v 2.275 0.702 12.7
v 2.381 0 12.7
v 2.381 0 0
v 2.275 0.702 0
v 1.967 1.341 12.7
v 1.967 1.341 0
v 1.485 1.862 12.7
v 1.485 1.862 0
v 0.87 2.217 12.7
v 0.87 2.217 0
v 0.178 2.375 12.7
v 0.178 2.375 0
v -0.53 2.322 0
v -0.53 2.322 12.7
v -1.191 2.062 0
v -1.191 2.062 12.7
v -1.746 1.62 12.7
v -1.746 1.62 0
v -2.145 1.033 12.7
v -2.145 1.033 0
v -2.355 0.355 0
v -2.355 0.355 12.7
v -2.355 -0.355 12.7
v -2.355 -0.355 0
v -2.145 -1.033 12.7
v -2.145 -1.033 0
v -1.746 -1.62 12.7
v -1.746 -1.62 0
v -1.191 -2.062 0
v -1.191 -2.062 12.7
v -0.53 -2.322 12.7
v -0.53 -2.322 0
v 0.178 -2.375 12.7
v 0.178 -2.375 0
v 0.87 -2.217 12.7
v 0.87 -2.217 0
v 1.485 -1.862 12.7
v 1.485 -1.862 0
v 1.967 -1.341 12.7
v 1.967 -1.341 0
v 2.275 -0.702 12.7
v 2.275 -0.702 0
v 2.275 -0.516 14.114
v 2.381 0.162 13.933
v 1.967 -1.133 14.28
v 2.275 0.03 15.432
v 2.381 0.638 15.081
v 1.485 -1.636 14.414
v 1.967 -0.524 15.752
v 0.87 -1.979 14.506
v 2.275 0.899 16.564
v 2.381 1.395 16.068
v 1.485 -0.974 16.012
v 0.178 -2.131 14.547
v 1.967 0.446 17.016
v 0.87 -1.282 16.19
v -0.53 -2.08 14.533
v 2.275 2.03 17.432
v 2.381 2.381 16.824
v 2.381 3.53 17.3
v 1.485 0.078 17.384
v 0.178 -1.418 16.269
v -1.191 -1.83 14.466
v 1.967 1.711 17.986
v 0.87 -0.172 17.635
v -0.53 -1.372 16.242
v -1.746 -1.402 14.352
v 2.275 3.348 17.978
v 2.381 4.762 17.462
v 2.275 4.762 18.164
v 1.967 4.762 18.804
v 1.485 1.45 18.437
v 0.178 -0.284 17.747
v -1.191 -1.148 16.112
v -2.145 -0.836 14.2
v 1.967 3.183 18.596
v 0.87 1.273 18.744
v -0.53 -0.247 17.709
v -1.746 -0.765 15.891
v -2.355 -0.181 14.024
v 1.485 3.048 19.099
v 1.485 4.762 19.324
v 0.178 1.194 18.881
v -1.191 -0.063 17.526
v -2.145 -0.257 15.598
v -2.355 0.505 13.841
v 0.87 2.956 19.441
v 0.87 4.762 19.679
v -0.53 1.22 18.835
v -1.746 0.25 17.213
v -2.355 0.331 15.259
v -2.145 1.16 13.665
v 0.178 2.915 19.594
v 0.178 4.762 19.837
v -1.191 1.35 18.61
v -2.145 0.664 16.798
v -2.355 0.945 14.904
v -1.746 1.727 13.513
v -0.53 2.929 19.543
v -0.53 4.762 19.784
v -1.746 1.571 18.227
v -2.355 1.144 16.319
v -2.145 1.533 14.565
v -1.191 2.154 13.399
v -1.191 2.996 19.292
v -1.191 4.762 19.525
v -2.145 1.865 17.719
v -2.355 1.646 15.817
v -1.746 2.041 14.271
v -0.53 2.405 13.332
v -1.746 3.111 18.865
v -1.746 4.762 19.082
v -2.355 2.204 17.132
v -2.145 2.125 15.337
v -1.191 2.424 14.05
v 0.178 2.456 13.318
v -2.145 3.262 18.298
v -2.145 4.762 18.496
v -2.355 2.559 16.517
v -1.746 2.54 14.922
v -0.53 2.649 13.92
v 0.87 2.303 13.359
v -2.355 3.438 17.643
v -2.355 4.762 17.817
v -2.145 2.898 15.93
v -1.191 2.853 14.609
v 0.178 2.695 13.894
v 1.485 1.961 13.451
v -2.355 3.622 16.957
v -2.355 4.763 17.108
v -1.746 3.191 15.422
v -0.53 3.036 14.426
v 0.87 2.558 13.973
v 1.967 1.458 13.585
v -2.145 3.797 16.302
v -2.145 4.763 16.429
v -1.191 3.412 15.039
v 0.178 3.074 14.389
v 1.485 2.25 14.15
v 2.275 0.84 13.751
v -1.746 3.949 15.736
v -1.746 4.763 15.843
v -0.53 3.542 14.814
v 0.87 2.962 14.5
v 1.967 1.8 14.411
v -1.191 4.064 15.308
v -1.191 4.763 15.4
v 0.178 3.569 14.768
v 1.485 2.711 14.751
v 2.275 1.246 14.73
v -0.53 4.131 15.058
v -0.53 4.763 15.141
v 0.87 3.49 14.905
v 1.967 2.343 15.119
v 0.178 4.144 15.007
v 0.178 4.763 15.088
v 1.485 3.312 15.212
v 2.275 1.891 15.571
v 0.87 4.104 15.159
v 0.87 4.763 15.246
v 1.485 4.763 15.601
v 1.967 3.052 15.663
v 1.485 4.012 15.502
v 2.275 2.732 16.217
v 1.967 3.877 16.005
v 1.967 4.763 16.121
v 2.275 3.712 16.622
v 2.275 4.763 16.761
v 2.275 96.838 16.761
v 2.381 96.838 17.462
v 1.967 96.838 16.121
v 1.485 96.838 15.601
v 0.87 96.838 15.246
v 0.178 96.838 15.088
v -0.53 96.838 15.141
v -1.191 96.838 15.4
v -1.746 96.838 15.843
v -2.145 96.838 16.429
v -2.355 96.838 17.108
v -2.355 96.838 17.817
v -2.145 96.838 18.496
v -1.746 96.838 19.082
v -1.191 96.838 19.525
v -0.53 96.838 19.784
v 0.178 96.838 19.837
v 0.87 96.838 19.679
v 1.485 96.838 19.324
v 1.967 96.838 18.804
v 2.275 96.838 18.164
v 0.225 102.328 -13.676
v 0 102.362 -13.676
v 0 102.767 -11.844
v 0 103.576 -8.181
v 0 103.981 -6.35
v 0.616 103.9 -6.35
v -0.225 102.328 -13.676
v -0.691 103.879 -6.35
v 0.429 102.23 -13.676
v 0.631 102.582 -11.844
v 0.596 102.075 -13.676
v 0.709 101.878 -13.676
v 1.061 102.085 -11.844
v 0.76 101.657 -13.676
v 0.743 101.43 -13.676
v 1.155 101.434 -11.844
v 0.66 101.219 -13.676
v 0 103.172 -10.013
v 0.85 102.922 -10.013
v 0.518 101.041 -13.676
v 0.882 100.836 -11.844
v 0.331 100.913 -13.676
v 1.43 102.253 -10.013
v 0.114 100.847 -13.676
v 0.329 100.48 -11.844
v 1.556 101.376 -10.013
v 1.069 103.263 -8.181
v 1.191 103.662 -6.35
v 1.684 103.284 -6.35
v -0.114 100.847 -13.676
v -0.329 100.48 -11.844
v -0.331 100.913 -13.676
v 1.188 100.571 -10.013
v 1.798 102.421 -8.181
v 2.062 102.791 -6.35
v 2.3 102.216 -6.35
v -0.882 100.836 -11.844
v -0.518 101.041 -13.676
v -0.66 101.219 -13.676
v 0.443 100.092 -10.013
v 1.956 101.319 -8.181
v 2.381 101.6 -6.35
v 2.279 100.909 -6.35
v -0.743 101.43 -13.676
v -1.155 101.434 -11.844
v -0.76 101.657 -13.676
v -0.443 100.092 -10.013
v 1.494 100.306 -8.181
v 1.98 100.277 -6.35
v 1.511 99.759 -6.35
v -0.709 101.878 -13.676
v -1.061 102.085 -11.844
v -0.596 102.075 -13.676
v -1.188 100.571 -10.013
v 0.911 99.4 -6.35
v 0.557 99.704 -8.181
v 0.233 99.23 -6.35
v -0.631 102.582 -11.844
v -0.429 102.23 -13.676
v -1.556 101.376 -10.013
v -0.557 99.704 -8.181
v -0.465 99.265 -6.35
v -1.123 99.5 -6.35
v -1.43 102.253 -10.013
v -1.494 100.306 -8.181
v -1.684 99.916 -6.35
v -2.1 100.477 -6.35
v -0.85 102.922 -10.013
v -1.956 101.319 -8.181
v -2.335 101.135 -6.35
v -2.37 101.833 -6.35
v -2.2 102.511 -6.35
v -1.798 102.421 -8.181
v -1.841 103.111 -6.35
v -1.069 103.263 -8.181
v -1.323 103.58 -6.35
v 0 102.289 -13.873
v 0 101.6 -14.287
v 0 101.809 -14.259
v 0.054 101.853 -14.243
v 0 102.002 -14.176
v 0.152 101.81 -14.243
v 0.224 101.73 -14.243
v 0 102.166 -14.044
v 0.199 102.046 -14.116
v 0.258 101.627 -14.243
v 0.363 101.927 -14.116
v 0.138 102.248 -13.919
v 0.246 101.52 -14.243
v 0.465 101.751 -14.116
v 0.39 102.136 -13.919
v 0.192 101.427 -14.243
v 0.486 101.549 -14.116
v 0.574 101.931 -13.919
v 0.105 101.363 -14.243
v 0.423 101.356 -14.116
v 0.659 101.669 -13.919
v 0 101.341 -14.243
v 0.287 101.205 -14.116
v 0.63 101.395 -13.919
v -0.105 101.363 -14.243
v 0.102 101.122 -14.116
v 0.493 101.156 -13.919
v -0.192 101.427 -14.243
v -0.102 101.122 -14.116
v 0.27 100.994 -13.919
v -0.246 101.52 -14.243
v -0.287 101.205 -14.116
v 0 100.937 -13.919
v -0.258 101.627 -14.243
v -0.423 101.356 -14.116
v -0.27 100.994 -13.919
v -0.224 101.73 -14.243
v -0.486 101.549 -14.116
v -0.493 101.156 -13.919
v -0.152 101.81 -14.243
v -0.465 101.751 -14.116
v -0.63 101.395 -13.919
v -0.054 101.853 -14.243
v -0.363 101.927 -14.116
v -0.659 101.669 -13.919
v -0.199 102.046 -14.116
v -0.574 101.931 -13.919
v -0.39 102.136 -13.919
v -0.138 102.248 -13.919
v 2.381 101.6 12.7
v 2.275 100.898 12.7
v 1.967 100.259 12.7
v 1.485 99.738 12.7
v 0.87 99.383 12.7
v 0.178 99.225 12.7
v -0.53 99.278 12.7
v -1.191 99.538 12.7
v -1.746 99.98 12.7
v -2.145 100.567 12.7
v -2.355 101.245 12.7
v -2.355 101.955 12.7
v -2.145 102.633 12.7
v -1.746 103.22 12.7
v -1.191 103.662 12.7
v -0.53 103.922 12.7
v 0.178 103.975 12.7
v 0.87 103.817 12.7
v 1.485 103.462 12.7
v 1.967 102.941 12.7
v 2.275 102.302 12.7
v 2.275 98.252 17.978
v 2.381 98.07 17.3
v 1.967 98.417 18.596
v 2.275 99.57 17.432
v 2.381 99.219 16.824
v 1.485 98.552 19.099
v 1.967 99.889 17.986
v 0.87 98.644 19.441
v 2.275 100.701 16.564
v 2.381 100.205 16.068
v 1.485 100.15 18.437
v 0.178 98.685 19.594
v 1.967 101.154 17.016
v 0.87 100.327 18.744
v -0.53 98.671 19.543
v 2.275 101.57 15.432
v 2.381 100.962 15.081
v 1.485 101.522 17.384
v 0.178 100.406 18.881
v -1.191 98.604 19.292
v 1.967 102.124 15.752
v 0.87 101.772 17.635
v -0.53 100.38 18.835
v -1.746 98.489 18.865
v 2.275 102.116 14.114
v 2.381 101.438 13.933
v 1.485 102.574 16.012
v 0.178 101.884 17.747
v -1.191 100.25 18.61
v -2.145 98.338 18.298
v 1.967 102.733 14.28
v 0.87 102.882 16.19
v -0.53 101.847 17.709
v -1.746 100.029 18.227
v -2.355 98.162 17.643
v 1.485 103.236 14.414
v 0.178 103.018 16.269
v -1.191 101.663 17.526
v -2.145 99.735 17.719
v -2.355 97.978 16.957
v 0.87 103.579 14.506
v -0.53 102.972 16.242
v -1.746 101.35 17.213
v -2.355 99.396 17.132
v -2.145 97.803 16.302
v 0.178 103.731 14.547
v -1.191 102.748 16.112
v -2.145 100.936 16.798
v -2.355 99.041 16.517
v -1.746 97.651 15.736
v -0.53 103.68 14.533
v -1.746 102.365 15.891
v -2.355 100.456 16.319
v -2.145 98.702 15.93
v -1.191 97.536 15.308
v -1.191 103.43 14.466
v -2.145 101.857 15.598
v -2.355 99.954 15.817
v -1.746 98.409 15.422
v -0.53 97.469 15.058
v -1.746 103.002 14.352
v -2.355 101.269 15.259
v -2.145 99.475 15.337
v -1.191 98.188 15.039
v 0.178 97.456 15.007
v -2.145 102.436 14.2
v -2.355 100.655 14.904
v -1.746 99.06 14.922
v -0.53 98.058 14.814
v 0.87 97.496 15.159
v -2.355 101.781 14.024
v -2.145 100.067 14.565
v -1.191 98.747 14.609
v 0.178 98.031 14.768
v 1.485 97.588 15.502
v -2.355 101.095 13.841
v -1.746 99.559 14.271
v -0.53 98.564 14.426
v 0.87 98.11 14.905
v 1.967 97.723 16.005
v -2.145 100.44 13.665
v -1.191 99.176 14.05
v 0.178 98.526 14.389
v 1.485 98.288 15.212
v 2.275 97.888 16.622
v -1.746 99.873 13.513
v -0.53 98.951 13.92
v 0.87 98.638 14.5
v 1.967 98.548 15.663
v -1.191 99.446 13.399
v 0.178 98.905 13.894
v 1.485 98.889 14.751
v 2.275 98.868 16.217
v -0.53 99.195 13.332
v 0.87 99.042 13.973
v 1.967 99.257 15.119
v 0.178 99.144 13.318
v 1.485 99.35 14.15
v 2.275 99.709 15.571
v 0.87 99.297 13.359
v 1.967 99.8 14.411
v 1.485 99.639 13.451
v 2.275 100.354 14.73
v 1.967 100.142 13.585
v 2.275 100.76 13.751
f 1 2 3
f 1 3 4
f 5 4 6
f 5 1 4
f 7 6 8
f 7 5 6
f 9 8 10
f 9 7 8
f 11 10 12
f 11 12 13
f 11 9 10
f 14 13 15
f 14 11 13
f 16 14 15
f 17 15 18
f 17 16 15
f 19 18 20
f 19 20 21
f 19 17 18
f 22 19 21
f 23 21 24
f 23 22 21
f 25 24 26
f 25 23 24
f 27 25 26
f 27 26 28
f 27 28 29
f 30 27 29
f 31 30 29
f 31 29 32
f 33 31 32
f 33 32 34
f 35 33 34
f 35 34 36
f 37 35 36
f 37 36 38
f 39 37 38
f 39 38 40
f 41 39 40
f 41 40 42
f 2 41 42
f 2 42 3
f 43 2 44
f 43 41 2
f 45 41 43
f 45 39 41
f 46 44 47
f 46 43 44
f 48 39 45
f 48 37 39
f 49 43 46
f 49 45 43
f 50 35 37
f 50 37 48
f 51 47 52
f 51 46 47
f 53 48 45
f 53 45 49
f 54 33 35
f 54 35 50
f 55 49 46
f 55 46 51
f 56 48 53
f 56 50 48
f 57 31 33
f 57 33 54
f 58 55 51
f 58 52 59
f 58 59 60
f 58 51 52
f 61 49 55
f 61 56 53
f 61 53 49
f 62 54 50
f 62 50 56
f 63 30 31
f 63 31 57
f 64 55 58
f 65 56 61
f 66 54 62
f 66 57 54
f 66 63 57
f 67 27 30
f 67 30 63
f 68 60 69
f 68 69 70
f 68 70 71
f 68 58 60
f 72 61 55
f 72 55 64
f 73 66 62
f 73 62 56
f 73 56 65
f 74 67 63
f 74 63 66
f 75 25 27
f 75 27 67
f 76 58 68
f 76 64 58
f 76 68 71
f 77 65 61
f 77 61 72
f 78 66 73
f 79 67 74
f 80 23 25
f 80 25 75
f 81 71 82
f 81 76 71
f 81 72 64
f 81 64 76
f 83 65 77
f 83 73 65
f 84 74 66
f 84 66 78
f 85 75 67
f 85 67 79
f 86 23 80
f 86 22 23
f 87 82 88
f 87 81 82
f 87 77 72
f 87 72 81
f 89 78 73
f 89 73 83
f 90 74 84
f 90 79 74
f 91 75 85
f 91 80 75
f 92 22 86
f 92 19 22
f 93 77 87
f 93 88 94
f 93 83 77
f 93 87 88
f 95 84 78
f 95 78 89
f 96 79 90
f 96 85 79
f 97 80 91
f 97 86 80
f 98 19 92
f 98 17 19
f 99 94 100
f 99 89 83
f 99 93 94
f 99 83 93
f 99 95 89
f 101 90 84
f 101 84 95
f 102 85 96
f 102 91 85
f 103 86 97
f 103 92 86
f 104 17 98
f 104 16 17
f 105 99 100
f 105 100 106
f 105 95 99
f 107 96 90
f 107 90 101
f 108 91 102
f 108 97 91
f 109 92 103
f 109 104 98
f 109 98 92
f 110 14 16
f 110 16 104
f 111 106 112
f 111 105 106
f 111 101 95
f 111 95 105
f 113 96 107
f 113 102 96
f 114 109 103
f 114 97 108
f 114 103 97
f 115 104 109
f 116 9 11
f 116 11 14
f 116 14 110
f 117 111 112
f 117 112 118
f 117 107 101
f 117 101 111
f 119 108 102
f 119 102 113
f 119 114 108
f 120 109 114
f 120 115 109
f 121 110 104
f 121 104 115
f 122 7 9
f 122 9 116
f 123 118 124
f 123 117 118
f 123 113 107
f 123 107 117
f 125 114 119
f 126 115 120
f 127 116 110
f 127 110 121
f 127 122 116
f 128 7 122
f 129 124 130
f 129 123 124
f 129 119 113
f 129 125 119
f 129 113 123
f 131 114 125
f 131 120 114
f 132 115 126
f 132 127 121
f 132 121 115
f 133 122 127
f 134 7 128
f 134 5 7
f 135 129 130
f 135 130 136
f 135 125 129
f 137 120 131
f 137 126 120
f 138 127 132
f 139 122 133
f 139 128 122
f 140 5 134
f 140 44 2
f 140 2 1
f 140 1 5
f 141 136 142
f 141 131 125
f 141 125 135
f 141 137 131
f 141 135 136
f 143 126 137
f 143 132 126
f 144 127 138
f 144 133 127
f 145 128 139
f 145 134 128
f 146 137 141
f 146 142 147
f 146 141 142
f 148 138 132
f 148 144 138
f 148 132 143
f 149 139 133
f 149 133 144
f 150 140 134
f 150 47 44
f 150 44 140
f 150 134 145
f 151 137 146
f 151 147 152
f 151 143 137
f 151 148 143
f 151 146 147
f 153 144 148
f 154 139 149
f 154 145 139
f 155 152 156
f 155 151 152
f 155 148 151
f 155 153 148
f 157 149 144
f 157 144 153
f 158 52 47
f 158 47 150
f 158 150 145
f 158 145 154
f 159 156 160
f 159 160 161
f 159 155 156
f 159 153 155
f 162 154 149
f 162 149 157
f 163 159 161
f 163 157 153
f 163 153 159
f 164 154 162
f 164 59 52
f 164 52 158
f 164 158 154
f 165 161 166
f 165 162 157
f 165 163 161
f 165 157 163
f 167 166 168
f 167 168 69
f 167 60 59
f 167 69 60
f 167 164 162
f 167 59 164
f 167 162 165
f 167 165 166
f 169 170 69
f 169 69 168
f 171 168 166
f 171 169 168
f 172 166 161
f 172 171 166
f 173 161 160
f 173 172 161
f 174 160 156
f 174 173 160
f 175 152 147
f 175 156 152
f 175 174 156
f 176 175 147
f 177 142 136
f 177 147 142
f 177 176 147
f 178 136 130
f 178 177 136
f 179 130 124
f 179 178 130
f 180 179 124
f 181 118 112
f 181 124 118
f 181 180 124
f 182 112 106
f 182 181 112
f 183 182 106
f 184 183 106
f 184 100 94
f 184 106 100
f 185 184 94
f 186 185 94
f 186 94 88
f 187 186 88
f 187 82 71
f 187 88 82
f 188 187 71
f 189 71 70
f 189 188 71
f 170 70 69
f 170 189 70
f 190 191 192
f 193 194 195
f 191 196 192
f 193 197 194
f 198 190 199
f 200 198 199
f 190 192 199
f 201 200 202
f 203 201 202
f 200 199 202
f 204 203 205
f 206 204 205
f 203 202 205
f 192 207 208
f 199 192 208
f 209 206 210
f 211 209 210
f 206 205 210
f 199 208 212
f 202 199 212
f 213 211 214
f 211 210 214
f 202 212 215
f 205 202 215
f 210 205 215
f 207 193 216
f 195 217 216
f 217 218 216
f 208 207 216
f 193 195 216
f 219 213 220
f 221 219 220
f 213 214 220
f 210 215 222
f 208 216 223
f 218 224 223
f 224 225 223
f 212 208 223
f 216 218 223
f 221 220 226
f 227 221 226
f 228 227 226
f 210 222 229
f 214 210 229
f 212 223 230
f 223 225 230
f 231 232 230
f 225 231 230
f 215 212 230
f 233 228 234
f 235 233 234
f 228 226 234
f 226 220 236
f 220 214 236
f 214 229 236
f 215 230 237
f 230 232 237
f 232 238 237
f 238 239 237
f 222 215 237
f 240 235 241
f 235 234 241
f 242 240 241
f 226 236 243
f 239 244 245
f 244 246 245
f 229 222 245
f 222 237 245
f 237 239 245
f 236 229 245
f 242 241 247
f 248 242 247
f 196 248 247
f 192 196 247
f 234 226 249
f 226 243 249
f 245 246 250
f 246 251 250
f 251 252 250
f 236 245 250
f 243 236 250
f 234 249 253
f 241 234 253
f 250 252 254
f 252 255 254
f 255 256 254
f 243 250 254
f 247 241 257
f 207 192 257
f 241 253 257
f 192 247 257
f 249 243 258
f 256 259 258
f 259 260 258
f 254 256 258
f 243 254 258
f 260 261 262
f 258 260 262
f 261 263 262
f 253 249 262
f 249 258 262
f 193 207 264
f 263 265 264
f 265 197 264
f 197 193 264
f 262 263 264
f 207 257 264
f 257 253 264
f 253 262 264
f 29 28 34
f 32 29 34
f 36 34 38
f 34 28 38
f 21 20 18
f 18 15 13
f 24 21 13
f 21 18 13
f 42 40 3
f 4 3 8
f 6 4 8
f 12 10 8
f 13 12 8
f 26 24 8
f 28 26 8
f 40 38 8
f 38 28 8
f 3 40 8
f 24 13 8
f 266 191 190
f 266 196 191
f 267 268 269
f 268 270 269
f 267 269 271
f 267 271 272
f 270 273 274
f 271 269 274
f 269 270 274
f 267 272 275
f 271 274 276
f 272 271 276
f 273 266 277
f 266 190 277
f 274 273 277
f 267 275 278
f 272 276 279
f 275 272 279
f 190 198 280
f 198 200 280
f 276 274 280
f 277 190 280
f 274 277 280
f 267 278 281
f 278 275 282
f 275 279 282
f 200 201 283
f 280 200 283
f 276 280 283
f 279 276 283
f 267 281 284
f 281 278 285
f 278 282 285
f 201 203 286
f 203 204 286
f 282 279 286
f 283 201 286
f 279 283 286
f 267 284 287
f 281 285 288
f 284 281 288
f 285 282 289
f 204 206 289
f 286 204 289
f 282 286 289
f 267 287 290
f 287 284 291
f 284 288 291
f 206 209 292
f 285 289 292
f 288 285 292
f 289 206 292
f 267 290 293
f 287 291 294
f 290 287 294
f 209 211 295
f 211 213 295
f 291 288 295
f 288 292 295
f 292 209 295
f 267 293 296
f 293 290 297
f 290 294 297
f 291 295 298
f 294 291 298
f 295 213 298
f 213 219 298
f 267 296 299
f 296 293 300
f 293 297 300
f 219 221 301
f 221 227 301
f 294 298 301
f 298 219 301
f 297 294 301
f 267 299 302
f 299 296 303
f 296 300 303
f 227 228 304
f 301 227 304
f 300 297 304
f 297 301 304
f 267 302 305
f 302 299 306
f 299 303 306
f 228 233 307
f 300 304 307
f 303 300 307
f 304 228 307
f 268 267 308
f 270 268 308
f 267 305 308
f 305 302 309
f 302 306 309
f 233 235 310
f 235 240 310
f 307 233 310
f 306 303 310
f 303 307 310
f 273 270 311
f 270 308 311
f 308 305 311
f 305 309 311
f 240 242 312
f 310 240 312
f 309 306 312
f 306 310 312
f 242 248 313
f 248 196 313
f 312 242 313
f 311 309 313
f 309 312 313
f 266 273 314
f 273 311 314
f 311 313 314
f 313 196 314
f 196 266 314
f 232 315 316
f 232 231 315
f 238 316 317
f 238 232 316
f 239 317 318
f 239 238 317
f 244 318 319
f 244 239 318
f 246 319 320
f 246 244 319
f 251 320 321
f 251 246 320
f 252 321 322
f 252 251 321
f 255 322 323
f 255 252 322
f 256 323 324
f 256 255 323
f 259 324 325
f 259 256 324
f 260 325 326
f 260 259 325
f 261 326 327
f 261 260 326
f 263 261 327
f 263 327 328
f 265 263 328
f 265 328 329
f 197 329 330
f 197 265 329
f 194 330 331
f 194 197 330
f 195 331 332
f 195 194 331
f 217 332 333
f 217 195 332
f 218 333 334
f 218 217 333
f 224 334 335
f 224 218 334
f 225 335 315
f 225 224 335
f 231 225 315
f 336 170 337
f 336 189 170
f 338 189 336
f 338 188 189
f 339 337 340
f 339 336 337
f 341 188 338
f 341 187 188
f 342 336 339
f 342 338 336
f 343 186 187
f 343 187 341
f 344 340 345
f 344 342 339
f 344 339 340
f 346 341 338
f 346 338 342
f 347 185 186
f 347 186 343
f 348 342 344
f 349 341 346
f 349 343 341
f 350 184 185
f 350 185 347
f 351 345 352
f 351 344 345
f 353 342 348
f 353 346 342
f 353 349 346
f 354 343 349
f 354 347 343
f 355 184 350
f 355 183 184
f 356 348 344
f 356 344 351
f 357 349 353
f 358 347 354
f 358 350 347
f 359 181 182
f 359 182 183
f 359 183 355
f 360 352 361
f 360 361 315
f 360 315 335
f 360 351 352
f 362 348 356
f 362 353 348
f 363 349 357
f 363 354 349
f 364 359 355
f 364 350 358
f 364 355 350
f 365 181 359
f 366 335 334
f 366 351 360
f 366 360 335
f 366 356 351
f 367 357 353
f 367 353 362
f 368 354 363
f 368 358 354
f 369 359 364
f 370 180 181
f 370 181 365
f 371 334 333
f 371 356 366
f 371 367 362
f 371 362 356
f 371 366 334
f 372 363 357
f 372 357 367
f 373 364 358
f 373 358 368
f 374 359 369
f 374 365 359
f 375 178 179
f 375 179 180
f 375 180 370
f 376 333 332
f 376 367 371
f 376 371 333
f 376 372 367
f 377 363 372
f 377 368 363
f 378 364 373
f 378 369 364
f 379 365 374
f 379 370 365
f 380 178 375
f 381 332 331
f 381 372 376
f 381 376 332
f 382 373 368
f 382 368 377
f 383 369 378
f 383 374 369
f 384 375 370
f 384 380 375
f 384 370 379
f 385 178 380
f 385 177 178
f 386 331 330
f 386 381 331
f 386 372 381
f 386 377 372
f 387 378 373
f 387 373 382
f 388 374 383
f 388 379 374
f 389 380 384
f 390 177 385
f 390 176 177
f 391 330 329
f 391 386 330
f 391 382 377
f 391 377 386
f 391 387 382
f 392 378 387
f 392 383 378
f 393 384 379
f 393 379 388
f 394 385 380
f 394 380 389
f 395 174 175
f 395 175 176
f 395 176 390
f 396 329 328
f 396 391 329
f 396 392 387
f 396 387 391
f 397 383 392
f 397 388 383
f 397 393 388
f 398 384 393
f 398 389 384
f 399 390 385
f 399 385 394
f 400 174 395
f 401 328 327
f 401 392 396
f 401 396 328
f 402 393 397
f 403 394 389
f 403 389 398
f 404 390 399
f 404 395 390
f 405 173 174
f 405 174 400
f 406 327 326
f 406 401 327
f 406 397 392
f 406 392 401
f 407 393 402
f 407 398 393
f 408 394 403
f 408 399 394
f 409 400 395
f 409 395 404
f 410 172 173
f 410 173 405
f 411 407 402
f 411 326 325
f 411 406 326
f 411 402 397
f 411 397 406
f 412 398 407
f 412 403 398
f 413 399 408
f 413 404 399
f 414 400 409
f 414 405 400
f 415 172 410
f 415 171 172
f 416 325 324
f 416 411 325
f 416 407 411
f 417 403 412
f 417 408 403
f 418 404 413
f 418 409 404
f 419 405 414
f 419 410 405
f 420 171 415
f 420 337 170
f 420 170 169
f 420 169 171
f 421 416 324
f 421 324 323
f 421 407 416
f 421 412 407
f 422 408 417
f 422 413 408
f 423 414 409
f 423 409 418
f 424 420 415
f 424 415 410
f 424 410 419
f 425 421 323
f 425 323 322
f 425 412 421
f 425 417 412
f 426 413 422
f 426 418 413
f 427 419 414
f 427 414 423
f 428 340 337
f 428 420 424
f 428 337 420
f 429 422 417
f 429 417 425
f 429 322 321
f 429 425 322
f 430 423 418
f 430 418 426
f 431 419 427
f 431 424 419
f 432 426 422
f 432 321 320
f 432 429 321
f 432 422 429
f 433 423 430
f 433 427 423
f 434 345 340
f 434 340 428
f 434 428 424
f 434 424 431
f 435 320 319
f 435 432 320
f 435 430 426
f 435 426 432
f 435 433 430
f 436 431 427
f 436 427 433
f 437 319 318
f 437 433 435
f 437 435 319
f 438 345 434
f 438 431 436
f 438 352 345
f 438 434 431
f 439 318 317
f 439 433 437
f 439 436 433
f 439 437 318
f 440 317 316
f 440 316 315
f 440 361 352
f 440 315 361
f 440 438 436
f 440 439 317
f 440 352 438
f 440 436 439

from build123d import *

# Parameters (mm, degrees)
F1_R = 2.38125


with BuildPart() as f2:
    # F2: sweep along a path in F0
    with BuildLine(Plane.YZ) as f2_path:
        Line((0, 0), (0, 12.7))
        ThreePointArc((0, 12.7), (1.3949039546, 16.0675960454), (4.7625, 17.4625))
        Line((4.7625, 17.4625), (96.8375, 17.4625))
        ThreePointArc((96.8375, 17.4625), (100.2050960454, 16.0675960454), (101.6, 12.7))
        Line((101.6, 12.7), (101.6, -6.35))
    # F1 (on Top) → F2 (sweep)
    with BuildSketch(Plane.XY):
        Circle(F1_R)
    sweep(path=f2_path.line)

    # F0 (on Right) → F3 (revolve)
    with BuildSketch(Plane.YZ):
        with BuildLine():
            Line((103.98125, -6.35), (101.6, -6.35))
            Line((101.6, -6.35), (101.6, -13.5071065476))
            Line((101.6, -13.5071065476), (101.6, -14.2875))
            ThreePointArc((101.6, -14.2875), (102.088655971, -14.1155712405), (102.362, -13.6755403345))
            Line((102.362, -13.6755403345), (103.98125, -6.35))
        make_face()
    revolve(axis=Axis((0, 101.6, -9.9285532738), (0, 0, -1)))


solid = f2.part
